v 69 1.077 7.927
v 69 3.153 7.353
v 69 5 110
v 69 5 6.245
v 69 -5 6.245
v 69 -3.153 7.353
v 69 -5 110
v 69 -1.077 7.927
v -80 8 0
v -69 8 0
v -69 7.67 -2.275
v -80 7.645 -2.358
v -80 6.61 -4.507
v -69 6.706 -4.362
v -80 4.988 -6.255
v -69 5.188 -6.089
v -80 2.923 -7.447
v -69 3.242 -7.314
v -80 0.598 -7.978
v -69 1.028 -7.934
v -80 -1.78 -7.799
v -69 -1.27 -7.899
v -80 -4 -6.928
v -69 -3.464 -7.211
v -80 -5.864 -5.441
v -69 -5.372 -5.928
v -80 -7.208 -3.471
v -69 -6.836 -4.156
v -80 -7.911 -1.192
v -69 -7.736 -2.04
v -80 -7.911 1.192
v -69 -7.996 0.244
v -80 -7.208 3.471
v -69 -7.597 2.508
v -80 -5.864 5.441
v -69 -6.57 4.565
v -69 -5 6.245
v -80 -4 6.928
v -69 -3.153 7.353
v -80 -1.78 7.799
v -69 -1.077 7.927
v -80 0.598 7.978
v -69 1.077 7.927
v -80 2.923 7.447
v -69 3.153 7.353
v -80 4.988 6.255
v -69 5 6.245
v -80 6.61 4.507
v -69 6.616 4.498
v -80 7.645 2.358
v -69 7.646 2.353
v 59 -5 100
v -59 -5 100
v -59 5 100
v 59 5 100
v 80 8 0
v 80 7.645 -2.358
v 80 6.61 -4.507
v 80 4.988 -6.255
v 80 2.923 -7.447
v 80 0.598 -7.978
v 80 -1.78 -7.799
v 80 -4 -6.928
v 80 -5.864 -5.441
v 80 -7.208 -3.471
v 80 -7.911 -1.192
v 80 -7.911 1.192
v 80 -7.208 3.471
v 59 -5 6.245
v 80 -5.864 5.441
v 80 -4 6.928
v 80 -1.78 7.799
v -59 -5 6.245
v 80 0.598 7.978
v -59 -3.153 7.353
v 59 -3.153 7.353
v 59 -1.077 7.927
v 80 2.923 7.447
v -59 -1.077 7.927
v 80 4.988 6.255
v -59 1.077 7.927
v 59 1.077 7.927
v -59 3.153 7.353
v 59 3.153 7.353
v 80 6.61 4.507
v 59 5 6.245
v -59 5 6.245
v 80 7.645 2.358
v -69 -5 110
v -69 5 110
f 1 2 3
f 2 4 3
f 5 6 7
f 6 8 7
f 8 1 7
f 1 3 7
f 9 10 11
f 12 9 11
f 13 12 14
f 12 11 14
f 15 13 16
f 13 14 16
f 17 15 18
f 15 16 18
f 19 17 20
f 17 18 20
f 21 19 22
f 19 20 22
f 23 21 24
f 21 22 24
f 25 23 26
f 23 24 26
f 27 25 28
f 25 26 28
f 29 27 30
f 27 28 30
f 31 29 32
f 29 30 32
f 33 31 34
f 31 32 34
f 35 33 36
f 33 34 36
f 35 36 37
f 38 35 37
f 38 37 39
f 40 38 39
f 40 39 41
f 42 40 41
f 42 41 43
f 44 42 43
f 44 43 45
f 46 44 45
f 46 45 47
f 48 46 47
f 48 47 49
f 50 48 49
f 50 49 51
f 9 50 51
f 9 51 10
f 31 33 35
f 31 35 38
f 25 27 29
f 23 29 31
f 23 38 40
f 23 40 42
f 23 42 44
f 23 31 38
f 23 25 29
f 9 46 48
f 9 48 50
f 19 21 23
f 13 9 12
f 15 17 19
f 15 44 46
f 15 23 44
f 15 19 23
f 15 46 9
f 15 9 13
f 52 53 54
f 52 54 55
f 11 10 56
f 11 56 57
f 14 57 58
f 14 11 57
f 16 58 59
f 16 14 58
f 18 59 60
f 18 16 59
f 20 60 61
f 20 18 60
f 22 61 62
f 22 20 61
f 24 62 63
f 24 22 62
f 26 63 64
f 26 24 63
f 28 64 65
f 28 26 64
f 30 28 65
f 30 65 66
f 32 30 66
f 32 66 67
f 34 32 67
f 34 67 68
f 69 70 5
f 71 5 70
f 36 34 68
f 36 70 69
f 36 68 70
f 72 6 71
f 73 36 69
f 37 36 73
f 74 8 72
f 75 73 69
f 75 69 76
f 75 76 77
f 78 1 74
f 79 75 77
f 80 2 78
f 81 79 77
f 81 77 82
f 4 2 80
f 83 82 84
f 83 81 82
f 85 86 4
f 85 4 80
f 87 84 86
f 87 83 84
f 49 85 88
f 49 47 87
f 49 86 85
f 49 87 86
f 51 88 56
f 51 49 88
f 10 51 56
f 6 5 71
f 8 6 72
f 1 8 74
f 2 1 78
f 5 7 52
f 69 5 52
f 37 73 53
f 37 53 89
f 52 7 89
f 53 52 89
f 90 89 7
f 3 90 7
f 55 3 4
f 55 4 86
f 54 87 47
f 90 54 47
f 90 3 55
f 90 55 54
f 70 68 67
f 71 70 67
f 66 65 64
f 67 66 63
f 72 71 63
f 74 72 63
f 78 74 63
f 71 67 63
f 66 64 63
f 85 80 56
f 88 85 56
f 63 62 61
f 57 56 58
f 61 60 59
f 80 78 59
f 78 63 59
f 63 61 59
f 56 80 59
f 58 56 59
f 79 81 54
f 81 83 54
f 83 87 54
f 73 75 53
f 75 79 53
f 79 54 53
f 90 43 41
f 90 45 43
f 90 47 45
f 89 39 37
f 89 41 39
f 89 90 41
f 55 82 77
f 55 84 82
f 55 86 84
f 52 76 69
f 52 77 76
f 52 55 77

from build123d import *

# Parameters (mm, degrees)
SKETCH_W          = 138
SKETCH_H          = 10
PAD_DEPTH         = 10
SKETCH001_W       = 10
SKETCH001_H       = 10
PAD001_DEPTH      = 100
SKETCH002_R       = 8
PAD002_DEPTH      = 11
PAD002_DEPTH_BACK = 149


with BuildPart() as part:
    # Sketch → Pad (new body)
    with BuildSketch(Plane(origin=(0, 0, 110), x_dir=(1, 0, 0), z_dir=(0, 0, -1))):
        Rectangle(SKETCH_W, SKETCH_H)
    extrude(amount=PAD_DEPTH)

    # Sketch001 → Pad001 (new body)
    with BuildSketch(Plane(origin=(0, 0, 100), x_dir=(1, 0, 0), z_dir=(0, 0, -1))):
        with Locations((-64, 0)):
            Rectangle(SKETCH001_W, SKETCH001_H)
    pad001 = extrude(amount=PAD001_DEPTH)

    # Mirrored: Pad001 across Sketch001 V_Axis
    add(pad001.mirror(Plane(origin=(0, 0, 100), x_dir=(0, 0, -1), z_dir=(1, 0, 0))))

    # Sketch002 → Pad002 (new body, two sides)
    with BuildSketch(Plane(origin=(-69, 0, 110), x_dir=(0, 1, 0), z_dir=(-1, 0, 0))) as pad002_sk:
        with Locations((0, 110)):
            Circle(SKETCH002_R)
    extrude(amount=PAD002_DEPTH)
    extrude(pad002_sk.sketch, amount=-PAD002_DEPTH_BACK)


solid = part.part
